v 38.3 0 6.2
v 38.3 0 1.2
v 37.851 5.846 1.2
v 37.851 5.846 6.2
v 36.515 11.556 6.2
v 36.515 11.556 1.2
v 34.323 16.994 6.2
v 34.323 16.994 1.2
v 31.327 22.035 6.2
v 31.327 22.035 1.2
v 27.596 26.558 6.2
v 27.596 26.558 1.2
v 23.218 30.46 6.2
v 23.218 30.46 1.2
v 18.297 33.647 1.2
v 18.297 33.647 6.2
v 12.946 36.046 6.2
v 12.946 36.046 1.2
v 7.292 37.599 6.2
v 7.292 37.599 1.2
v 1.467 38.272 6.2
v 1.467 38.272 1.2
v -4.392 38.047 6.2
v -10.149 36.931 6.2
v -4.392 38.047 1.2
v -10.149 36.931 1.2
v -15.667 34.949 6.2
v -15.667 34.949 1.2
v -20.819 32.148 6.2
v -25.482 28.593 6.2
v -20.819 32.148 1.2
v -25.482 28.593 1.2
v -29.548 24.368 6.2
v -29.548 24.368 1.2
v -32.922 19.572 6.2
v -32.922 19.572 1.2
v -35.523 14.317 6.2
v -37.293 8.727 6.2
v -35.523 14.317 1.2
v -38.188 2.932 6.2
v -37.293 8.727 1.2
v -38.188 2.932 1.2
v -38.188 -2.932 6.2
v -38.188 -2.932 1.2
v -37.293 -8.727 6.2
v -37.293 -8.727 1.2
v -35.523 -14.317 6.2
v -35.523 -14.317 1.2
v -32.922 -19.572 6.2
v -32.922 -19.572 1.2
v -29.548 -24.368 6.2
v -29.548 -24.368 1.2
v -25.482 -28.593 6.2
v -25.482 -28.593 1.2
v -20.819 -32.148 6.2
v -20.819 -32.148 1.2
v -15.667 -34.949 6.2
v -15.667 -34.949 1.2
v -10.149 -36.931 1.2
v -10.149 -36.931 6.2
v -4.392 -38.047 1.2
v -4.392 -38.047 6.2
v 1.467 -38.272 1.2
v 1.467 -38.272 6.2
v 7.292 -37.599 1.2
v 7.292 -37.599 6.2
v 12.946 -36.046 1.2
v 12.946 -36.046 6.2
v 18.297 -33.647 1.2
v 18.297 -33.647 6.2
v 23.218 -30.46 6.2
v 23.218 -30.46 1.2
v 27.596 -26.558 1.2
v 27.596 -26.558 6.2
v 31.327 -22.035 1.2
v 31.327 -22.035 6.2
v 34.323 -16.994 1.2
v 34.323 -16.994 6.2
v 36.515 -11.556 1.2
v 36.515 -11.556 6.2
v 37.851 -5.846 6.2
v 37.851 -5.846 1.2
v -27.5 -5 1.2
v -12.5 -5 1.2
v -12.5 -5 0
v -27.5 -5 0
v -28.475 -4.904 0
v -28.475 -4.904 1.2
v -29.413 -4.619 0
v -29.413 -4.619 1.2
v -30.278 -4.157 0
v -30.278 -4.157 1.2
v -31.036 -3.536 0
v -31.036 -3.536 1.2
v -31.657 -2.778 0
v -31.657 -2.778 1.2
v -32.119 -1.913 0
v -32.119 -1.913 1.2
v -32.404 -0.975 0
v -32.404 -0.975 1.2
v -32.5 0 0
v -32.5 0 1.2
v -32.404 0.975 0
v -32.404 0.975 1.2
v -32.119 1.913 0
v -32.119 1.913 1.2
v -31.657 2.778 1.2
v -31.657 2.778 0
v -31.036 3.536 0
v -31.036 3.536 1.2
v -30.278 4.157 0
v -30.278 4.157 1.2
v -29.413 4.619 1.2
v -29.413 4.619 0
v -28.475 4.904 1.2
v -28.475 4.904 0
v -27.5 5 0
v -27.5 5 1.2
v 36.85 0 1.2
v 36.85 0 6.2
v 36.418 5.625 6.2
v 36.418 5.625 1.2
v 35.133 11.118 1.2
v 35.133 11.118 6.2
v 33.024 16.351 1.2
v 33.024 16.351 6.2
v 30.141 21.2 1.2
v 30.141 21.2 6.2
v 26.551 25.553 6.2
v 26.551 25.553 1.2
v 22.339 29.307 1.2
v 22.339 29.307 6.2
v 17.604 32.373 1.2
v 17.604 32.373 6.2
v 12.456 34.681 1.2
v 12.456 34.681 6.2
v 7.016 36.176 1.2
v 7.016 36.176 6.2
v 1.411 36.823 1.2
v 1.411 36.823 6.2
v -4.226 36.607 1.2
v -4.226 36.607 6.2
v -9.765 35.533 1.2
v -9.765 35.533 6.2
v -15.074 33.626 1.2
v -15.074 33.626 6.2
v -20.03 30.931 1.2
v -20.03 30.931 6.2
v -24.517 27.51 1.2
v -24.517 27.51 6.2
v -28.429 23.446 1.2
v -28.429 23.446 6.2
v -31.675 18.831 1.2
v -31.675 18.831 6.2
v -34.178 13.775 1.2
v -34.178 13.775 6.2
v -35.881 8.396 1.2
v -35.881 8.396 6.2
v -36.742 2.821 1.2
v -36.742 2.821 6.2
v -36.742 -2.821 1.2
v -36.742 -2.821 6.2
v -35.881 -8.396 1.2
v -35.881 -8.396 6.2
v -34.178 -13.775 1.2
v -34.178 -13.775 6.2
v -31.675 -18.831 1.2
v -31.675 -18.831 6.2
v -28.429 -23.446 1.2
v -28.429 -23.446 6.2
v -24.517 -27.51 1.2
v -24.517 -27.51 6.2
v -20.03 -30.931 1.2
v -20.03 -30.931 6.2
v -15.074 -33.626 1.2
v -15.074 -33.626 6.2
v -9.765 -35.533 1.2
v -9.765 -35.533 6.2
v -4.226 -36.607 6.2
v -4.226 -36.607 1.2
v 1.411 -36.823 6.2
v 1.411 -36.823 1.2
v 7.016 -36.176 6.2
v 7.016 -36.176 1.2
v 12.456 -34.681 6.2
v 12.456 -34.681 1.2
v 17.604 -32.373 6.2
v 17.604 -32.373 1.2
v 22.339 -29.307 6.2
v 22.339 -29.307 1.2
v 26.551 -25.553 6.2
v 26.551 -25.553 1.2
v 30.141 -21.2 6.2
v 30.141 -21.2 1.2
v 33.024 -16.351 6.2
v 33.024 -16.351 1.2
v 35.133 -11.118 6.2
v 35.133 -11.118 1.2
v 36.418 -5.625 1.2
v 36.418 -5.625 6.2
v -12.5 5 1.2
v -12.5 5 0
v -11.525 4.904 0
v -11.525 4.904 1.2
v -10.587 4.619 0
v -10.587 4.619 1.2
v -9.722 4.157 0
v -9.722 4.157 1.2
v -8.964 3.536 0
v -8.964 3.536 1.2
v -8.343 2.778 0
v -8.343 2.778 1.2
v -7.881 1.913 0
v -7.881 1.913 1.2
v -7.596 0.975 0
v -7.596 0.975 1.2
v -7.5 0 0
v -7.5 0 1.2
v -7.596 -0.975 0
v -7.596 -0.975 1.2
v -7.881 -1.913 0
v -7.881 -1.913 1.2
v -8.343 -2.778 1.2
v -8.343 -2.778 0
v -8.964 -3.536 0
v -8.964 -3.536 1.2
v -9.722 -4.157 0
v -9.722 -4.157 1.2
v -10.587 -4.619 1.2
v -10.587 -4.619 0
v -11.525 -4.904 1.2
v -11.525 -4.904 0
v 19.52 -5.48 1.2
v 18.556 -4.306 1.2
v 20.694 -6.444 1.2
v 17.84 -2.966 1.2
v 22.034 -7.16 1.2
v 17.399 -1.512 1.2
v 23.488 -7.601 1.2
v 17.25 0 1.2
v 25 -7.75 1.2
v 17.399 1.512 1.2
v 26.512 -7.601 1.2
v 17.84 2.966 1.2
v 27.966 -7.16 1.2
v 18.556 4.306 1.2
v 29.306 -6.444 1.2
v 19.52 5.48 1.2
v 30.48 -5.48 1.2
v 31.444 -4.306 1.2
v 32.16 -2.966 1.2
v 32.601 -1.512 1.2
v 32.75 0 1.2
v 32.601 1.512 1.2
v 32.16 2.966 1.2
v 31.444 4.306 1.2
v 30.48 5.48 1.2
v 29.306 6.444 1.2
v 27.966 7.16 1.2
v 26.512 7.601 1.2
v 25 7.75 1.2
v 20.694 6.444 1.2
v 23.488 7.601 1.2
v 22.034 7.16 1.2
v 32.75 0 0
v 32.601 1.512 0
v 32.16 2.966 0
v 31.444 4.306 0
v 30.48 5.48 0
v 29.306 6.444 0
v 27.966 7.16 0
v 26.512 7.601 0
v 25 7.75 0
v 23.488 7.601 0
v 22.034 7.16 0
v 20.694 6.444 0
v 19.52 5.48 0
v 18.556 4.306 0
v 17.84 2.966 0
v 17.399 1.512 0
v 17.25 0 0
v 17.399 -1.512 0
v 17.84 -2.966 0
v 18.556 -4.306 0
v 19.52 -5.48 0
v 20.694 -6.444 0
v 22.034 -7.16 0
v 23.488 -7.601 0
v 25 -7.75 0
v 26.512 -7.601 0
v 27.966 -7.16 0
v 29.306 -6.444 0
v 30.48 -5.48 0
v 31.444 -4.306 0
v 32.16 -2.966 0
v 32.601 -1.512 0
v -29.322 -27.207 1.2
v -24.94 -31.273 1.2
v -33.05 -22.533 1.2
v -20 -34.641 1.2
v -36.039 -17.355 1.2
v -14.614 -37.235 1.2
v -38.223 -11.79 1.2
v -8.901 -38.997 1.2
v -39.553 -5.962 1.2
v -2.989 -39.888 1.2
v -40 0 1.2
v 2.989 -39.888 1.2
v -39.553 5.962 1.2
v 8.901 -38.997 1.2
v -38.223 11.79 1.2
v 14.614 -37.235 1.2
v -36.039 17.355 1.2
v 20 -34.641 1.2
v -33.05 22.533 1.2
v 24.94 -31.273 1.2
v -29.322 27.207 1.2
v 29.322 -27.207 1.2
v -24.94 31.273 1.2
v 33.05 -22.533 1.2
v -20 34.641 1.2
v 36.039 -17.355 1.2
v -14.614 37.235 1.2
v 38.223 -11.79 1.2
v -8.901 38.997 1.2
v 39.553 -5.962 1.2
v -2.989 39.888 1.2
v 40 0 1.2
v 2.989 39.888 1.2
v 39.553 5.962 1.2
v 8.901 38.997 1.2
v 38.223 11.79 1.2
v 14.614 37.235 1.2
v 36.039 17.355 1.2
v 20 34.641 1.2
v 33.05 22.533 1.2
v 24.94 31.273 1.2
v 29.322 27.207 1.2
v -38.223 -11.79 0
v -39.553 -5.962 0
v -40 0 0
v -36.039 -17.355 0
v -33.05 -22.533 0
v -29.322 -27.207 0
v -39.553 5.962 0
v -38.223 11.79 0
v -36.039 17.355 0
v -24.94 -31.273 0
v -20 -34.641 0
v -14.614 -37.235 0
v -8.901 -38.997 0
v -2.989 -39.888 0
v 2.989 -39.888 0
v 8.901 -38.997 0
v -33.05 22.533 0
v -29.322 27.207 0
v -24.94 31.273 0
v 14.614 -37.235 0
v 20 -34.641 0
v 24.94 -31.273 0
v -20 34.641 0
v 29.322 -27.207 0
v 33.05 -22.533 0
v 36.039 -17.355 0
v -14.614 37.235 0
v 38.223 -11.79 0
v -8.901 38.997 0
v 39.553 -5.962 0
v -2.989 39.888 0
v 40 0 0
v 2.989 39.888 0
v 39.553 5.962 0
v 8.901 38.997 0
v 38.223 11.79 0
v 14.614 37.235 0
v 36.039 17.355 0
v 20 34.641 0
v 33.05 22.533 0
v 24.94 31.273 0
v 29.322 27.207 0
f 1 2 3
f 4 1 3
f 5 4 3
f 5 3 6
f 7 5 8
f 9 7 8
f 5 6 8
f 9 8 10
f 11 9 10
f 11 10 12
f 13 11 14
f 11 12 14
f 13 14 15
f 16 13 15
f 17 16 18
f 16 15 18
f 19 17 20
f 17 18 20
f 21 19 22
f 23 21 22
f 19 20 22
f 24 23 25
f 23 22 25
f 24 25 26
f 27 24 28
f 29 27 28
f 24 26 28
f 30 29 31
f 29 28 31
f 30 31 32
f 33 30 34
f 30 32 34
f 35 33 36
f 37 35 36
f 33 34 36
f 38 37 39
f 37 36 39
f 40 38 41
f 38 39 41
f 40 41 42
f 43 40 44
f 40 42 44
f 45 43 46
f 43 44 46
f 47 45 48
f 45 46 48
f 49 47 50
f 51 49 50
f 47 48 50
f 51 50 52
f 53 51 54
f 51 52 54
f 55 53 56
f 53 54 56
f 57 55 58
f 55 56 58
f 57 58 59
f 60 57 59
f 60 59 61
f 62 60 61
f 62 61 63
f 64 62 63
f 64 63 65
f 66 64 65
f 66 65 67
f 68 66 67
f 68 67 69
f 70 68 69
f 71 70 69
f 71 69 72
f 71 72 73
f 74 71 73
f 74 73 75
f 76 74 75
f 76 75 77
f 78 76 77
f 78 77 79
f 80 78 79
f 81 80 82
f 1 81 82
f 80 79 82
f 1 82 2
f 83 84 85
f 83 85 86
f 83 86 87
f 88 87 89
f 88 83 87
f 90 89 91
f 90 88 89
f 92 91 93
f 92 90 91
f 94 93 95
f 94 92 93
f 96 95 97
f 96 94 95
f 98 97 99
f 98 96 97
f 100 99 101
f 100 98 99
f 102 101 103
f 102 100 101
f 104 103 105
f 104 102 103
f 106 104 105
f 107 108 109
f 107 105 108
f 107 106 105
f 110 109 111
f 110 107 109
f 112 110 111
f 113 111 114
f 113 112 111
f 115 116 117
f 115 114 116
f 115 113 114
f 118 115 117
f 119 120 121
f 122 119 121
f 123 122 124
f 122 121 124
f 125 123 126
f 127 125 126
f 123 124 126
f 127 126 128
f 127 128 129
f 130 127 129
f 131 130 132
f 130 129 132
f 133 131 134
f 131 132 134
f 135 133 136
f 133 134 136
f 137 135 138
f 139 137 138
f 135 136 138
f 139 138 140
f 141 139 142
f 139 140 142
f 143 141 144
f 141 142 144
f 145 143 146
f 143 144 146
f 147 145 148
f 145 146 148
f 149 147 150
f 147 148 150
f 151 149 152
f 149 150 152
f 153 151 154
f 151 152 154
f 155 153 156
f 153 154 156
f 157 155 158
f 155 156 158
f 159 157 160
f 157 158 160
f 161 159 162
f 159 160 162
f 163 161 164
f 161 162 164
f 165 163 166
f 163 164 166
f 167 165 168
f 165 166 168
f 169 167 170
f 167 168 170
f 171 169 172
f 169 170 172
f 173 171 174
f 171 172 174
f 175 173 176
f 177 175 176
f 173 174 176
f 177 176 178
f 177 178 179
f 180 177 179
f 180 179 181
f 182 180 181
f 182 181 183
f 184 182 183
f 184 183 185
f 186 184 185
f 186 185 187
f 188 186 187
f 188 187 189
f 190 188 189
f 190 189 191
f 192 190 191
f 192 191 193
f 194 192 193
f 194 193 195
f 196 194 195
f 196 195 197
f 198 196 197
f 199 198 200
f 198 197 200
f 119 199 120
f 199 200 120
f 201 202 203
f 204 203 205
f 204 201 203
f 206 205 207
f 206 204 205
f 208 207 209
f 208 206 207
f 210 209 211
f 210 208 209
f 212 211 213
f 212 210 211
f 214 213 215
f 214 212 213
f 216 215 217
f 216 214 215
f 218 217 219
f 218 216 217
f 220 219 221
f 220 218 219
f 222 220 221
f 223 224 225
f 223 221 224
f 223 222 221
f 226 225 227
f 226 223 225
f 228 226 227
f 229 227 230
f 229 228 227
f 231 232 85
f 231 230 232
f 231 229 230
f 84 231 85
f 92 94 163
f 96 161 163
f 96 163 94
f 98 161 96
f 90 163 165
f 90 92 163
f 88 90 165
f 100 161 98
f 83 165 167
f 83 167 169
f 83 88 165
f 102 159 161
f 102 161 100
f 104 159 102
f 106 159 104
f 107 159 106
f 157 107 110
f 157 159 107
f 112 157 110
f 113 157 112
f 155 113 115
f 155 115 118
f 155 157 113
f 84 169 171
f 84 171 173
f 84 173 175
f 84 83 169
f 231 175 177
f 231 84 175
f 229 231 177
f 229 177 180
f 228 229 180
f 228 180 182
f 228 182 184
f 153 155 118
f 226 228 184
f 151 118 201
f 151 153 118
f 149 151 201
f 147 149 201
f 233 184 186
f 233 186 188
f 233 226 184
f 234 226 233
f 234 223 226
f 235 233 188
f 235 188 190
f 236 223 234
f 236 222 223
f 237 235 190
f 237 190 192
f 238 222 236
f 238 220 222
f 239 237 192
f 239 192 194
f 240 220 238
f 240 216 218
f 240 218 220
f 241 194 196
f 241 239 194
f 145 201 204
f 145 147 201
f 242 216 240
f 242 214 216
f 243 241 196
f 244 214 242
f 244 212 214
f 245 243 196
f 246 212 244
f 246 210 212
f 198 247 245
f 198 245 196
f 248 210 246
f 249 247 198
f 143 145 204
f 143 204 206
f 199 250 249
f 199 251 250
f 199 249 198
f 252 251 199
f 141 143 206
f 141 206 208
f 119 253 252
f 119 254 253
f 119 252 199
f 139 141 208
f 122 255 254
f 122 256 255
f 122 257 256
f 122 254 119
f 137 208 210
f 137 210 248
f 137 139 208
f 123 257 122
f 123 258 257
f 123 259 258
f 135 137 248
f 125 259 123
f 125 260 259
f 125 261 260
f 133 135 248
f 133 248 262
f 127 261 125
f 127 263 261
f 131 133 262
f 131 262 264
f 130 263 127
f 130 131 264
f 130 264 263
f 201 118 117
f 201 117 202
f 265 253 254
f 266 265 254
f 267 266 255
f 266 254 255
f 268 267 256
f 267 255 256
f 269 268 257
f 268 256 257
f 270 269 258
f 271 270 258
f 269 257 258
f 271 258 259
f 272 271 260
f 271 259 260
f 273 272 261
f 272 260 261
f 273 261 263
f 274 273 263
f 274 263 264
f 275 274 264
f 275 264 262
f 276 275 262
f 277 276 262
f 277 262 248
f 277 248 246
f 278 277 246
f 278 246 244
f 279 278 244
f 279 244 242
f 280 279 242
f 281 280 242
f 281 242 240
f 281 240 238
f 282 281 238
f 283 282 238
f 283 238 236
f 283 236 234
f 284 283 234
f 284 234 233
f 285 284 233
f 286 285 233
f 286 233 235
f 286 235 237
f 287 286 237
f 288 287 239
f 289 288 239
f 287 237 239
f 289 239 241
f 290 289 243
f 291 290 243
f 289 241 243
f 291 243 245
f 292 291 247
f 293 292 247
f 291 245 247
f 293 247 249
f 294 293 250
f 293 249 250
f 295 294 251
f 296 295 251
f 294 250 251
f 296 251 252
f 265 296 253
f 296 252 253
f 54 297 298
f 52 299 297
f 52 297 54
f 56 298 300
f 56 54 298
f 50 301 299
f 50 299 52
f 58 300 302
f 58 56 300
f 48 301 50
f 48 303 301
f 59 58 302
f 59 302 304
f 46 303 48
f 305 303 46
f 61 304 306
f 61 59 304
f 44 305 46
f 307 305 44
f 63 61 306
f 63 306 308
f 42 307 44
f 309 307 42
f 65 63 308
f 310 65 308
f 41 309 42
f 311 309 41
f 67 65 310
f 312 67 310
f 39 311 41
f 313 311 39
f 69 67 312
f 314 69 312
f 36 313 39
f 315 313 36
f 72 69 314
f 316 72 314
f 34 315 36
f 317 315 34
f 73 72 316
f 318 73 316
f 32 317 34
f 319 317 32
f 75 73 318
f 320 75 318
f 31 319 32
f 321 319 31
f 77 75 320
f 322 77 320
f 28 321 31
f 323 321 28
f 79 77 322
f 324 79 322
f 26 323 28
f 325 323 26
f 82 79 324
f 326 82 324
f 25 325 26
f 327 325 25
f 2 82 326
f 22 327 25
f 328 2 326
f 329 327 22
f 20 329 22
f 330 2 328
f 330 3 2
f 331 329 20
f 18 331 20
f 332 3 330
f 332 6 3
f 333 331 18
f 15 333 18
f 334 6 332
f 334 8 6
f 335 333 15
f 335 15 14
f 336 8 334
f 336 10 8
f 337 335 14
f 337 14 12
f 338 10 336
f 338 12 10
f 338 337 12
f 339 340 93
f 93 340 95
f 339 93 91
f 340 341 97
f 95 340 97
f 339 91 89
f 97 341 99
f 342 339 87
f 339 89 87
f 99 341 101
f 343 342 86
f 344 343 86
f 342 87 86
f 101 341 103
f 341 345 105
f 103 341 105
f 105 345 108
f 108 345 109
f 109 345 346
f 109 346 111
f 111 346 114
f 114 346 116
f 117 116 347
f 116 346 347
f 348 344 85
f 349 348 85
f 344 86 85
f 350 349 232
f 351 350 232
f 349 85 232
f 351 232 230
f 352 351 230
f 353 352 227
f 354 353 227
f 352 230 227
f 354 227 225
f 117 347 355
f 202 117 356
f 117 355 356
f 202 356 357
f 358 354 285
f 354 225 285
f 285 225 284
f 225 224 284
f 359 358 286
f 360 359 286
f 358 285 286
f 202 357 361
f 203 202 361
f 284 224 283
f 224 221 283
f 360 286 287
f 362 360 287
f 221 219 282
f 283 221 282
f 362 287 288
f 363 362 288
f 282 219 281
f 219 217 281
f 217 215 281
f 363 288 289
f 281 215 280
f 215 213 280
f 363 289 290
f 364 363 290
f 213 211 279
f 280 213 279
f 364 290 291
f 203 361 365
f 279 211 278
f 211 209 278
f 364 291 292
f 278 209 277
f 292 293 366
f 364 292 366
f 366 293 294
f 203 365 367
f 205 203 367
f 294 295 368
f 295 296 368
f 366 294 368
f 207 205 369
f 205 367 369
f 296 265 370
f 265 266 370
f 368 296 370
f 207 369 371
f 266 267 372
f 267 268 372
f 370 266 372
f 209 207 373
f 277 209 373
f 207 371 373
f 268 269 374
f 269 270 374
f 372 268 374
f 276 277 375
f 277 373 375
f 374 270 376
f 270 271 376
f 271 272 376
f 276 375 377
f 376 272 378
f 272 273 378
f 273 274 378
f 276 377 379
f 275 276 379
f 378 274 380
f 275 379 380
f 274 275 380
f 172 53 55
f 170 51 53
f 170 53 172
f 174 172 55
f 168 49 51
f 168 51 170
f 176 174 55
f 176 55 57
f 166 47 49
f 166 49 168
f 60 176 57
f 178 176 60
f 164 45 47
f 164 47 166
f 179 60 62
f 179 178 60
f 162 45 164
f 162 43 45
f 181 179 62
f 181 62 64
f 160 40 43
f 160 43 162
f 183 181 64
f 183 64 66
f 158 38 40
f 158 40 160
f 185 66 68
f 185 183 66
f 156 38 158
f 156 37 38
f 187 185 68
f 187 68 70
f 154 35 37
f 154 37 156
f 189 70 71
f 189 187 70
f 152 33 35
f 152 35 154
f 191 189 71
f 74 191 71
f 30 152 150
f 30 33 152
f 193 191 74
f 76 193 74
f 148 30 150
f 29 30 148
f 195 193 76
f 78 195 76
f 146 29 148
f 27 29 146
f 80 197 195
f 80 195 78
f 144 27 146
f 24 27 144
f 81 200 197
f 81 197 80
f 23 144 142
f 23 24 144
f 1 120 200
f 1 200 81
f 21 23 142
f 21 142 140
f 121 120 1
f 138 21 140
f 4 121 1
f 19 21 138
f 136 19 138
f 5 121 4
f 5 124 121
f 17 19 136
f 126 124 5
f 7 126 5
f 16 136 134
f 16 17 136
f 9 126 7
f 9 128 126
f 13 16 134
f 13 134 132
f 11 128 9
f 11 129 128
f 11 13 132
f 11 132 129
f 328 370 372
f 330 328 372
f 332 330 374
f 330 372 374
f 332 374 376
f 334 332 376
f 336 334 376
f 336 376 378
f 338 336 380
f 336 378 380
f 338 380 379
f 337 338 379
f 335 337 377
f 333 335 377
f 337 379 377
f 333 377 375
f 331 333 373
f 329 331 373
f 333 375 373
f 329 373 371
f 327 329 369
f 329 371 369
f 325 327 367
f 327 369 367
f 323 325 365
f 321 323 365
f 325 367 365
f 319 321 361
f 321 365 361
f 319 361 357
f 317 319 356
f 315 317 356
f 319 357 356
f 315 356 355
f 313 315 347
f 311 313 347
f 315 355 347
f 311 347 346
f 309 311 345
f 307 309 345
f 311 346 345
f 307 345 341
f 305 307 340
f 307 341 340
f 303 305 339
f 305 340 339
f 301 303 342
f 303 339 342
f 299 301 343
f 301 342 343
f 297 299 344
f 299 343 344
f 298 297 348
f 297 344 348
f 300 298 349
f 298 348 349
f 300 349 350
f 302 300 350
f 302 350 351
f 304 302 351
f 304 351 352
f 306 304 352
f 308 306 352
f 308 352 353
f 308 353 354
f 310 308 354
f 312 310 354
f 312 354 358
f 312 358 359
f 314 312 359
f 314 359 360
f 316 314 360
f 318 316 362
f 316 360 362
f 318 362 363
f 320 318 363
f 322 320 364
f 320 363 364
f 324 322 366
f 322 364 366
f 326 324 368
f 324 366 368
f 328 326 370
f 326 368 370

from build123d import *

# Parameters (mm, degrees)
SKETCH1_R           = 40
BOSS_EXTRUDE1_DEPTH = 1.2
CUT_EXTRUDE1_REACH  = 58.581
SKETCH2_R           = 7.75
CUT_EXTRUDE2_REACH  = 58.581
SKETCH4_R           = 38.3
BOSS_EXTRUDE2_DEPTH = 5
SKETCH5_R           = 36.85
CUT_EXTRUDE3_DEPTH  = 5


with BuildPart() as part:
    # Sketch1 → Boss-Extrude1 (new body)
    with BuildSketch(Plane.XY):
        Circle(SKETCH1_R)
    extrude(amount=BOSS_EXTRUDE1_DEPTH)

    # Sketch2 → Cut-Extrude1 (cut, up to next)
    with BuildSketch(Plane.XY.offset(1.2), mode=Mode.PRIVATE) as cut_extrude1_sk1:
        with Locations((25, 0)):
            Circle(SKETCH2_R)
    cut_extrude1_tool1 = extrude(cut_extrude1_sk1.sketch, amount=-CUT_EXTRUDE1_REACH, mode=Mode.PRIVATE) & part.part
    add(cut_extrude1_tool1.solids().sort_by_distance((25, 0, 1.2))[0], mode=Mode.SUBTRACT)

    # Sketch3 → Cut-Extrude2 (cut, up to next)
    with BuildSketch(Plane.XY.offset(1.2), mode=Mode.PRIVATE) as cut_extrude2_sk1:
        with BuildLine():
            Line((-27.5, 5), (-12.5, 5))
            ThreePointArc((-12.5, 5), (-7.5, 0), (-12.5, -5))
            Line((-12.5, -5), (-27.5, -5))
            ThreePointArc((-27.5, -5), (-32.5, 0), (-27.5, 5))
        make_face()
    cut_extrude2_tool1 = extrude(cut_extrude2_sk1.sketch, amount=-CUT_EXTRUDE2_REACH, mode=Mode.PRIVATE) & part.part
    add(cut_extrude2_tool1.solids().sort_by_distance((-20, 0, 1.2))[0], mode=Mode.SUBTRACT)

    # Sketch4 → Boss-Extrude2 (add)
    with BuildSketch(Plane.XY.offset(1.2)):
        Circle(SKETCH4_R)
    extrude(amount=BOSS_EXTRUDE2_DEPTH)

    # Sketch5 → Cut-Extrude3 (cut)
    with BuildSketch(Plane.XY.offset(6.2)):
        Circle(SKETCH5_R)
    extrude(amount=-CUT_EXTRUDE3_DEPTH, mode=Mode.SUBTRACT)


solid = part.part
